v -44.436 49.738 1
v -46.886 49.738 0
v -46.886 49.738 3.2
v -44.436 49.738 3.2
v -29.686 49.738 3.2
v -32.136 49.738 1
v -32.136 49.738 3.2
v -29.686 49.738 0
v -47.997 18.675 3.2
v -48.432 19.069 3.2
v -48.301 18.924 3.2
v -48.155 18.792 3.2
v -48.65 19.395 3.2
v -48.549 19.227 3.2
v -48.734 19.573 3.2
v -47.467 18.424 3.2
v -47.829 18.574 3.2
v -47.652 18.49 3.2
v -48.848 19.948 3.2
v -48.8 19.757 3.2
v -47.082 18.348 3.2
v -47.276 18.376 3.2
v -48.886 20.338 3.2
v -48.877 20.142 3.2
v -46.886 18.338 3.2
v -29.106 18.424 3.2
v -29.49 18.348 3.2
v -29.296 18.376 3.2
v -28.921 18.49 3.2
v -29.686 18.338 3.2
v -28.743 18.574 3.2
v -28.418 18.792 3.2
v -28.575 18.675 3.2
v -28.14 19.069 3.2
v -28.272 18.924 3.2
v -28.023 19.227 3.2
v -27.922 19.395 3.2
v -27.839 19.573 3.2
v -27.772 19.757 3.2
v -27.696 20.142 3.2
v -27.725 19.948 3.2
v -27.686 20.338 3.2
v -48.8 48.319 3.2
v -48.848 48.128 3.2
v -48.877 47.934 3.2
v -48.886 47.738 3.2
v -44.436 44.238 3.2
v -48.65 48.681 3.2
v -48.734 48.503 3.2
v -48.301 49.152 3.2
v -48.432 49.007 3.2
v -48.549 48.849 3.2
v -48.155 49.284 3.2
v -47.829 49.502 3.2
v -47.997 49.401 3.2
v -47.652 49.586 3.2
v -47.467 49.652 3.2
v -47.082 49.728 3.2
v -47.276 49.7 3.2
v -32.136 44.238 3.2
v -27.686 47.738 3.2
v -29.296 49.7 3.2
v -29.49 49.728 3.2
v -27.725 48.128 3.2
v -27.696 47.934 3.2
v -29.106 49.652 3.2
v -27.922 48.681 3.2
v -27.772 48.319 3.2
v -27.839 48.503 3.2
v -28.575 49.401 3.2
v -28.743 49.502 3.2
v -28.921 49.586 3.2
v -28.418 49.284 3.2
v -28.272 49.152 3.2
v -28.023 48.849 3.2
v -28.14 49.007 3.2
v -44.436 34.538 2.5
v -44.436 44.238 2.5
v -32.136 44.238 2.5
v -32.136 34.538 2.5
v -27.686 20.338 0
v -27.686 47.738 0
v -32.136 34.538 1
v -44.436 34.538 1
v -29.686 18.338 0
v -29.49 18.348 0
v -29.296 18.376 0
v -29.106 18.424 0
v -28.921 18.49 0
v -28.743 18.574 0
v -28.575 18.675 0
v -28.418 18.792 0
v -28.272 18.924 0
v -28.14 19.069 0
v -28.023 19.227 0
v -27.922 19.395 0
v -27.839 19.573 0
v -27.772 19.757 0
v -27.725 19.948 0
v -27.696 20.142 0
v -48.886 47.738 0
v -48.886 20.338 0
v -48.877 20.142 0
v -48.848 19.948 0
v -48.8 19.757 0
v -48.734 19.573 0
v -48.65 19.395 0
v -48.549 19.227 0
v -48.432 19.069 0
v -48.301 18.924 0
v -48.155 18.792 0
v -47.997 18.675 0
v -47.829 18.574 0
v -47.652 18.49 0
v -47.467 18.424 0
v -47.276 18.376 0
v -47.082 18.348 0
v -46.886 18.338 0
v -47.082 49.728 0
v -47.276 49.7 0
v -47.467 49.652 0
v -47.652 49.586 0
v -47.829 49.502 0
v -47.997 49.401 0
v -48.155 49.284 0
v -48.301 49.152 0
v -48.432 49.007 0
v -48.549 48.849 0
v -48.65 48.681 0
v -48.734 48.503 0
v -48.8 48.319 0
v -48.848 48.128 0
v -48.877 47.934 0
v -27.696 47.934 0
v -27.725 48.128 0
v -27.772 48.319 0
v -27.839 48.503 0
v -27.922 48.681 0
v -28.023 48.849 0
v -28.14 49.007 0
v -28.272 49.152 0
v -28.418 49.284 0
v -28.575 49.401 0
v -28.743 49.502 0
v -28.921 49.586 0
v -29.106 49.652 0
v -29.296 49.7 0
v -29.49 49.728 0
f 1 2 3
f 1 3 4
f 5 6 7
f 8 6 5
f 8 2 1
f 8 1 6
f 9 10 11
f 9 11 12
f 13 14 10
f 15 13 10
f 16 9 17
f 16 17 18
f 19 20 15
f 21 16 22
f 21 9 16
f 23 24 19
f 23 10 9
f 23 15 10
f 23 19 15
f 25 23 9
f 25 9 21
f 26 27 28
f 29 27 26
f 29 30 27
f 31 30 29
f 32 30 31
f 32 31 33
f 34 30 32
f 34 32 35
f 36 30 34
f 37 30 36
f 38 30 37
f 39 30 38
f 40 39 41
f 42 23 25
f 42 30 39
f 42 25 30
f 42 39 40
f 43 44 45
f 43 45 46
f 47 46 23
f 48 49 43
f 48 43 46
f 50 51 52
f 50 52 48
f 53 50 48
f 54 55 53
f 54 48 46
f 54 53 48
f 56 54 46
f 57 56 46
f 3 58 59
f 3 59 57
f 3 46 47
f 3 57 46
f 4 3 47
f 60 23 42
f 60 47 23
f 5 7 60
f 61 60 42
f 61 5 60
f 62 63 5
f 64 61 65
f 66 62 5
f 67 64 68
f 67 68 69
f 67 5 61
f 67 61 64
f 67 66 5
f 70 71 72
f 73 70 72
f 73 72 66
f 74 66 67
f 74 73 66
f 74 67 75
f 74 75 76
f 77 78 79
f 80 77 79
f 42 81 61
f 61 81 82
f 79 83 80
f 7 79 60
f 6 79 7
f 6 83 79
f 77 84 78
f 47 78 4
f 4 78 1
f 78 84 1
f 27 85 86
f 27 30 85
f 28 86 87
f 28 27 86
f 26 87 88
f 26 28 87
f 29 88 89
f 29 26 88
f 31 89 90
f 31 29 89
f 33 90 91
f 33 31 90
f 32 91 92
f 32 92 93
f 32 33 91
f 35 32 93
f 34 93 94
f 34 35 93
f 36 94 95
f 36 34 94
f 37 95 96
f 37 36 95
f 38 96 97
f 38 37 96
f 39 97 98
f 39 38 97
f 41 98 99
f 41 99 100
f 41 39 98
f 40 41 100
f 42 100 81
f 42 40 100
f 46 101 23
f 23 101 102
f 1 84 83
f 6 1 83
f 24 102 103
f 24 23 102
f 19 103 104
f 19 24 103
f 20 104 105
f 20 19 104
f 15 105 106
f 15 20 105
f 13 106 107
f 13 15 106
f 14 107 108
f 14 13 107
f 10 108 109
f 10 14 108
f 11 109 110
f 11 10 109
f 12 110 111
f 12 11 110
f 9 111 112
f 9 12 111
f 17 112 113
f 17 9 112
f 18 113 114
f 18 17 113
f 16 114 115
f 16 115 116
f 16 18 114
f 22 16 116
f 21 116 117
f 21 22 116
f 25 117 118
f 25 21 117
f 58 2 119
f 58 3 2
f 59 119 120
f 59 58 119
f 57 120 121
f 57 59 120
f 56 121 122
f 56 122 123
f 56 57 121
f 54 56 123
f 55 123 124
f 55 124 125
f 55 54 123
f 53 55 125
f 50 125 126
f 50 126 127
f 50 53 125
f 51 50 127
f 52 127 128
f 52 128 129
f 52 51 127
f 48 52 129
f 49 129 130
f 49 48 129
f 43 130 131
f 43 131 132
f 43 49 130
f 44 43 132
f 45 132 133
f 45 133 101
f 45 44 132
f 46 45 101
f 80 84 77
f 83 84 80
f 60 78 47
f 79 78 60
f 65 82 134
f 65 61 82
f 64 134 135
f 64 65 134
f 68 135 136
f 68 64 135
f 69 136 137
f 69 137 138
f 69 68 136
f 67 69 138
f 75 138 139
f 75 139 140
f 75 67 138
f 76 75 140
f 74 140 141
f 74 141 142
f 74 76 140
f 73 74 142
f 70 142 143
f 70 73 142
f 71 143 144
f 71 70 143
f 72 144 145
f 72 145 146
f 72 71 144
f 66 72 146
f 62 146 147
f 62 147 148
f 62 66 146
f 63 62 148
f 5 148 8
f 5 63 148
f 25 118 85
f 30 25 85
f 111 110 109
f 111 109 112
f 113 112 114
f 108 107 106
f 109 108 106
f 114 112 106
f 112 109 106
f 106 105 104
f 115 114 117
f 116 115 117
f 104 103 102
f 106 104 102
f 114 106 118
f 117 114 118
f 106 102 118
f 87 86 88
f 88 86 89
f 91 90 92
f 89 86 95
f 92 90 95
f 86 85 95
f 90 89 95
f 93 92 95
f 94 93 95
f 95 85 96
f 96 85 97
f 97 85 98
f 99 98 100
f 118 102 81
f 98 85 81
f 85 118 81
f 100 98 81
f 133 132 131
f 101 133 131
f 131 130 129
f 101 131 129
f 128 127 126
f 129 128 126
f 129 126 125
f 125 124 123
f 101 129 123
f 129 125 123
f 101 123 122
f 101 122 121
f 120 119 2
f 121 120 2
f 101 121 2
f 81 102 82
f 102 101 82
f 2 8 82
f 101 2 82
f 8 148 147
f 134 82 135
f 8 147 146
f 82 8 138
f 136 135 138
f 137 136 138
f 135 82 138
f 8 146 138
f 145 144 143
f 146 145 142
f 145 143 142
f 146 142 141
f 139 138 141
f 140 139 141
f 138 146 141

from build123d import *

# Parameters (mm, degrees)
F0_W     = 12.3
F0_H     = 9.7
F1_DEPTH = 3.2
F2_R     = 2
F3_DEPTH = 2.5
F0_H_2   = 5.5
F4_DEPTH = 1


with BuildPart() as f1:
    # F0 (on Top) → F1 (new body)
    with BuildSketch(Plane.XY):
        Polygon((-44.4362910628, 49.737931484), (-48.8862910628, 49.737931484), (-48.8862910628, 18.337931484), (-27.6862910628, 18.337931484), (-27.6862910628, 49.737931484), (-32.1362910628, 49.737931484), (-32.1362910628, 44.237931484), (-32.1362910628, 34.537931484), (-44.4362910628, 34.537931484), (-44.4362910628, 44.237931484), align=None)
        with Locations((-38.2862910628, 39.387931484)):
            Rectangle(F0_W, F0_H)
    extrude(amount=F1_DEPTH)

    # F2
    f2_edges = [f1.edges().sort_by_distance(p)[0] for p in [
        (-27.686291, 18.337931, 1.6),
        (-27.686291, 49.737931, 1.6),
        (-48.886291, 18.337931, 1.6),
        (-48.886291, 49.737931, 1.6),
    ]]
    fillet(f2_edges, radius=F2_R)

    # F0 (on Top) → F3 (cut)
    with BuildSketch(Plane.XY):
        with Locations((-38.2862910628, 39.387931484)):
            Rectangle(F0_W, F0_H)
    extrude(amount=F3_DEPTH, mode=Mode.SUBTRACT)

    # F0 (on Top) → F4 (join)
    with BuildSketch(Plane.XY):
        with Locations((-38.2862910628, 39.387931484)):
            Rectangle(F0_W, F0_H)
        with Locations((-38.2862910628, 46.987931484)):
            Rectangle(F0_W, F0_H_2)
    extrude(amount=F4_DEPTH)


solid = f1.part
